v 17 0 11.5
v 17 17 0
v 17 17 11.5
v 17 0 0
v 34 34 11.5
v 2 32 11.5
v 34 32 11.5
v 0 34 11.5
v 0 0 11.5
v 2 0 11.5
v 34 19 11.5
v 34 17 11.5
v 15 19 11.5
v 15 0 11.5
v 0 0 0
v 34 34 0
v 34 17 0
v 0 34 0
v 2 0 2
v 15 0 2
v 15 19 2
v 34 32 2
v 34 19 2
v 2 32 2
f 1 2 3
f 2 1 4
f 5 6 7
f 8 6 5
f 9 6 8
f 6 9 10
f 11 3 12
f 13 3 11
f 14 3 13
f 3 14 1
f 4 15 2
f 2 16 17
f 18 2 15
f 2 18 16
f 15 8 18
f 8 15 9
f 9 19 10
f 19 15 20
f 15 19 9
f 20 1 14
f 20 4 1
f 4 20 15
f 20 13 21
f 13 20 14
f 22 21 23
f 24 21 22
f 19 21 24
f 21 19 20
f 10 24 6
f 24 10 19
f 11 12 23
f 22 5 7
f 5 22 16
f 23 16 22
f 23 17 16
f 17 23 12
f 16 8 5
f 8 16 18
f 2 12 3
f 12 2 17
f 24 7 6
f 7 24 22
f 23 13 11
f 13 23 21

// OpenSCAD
pipeWidth = 12;
pipeHeight = 9;
edge = 2;
margin = 0.5;
type = "hookRight"; // [hookRight, hookUp, hookDown]

totalWidth = pipeWidth + (edge * 2) + margin * 2;
totalHeight = pipeHeight + edge + margin;

if (type == "hookRight") {
  rightHook();
} else if (type == "hookUp") {
  hookUp();
} else if (type == "hookDown") {
  hookDown();
}

module pipeShell() {
  difference() {
    cube(size = [totalWidth, totalWidth, totalHeight]);
    translate([edge, edge, edge]) {
      cube([pipeWidth + margin * 2, pipeWidth + margin * 2, pipeHeight + margin]);   
    }
  }
}

module horizontalOpening() {
    cube([totalWidth - edge * 2, edge + margin, totalHeight - edge]);
}

module verticalOpening() {
    cube([edge + margin, totalWidth - edge * 2, totalHeight - edge]);
}

module pipeOpen(direction) {
  if (direction == "left")
  {
    difference() {
      pipeShell();
      translate ([0, edge, edge]) verticalOpening();
    }
  } else if (direction == "right")
  {
    difference() {
      pipeShell();
      translate ([pipeWidth + edge + margin, edge, edge]) verticalOpening();
    }
  } else if (direction == "bottom")
  {
    difference() {
      pipeShell();
      translate ([edge, 0, edge]) horizontalOpening();
    }
  } else if (direction == "top")
  {
    difference() {
      pipeShell();
      translate ([edge, totalWidth - edge, edge]) horizontalOpening();
    }
  }
}

module rightHook() {
    union() {
      intersection() {
          pipeOpen("bottom");
          pipeOpen("top");
      }
      translate([totalWidth, totalWidth, 0]) {
          intersection() {
            pipeOpen("right");
            pipeOpen("left");
          }
      }
      translate([0, totalWidth, 0]) {
          intersection() {
            pipeOpen("bottom");
            pipeOpen("right");
          }
      }
    }
}

module hookUp() {
    union() {
      intersection() {
          pipeOpen("bottom");
          pipeOpen("top");
      }
      translate([0, totalWidth, 0]) rotate([90,0,0])  {
          intersection() {
            pipeOpen("bottom");
            pipeOpen("top");
          }
      }
    }
}

module hookDown() {
    union() {
      rotate([180,0,0]) translate([0, -totalWidth, -totalHeight]) intersection() {
          pipeOpen("bottom");
          pipeOpen("top");
      }
      translate([totalWidth, totalWidth, totalHeight]) rotate([90, 0,180]) {
          intersection() {
            pipeOpen("bottom");
            pipeOpen("top");
          }
      }
    }
    translate([0, totalWidth, 0]) scale([1, totalHeight / totalWidth, 1])  {
          intersection() {
              pipeOpen("bottom");
              pipeOpen("top");
      }
    }
}
